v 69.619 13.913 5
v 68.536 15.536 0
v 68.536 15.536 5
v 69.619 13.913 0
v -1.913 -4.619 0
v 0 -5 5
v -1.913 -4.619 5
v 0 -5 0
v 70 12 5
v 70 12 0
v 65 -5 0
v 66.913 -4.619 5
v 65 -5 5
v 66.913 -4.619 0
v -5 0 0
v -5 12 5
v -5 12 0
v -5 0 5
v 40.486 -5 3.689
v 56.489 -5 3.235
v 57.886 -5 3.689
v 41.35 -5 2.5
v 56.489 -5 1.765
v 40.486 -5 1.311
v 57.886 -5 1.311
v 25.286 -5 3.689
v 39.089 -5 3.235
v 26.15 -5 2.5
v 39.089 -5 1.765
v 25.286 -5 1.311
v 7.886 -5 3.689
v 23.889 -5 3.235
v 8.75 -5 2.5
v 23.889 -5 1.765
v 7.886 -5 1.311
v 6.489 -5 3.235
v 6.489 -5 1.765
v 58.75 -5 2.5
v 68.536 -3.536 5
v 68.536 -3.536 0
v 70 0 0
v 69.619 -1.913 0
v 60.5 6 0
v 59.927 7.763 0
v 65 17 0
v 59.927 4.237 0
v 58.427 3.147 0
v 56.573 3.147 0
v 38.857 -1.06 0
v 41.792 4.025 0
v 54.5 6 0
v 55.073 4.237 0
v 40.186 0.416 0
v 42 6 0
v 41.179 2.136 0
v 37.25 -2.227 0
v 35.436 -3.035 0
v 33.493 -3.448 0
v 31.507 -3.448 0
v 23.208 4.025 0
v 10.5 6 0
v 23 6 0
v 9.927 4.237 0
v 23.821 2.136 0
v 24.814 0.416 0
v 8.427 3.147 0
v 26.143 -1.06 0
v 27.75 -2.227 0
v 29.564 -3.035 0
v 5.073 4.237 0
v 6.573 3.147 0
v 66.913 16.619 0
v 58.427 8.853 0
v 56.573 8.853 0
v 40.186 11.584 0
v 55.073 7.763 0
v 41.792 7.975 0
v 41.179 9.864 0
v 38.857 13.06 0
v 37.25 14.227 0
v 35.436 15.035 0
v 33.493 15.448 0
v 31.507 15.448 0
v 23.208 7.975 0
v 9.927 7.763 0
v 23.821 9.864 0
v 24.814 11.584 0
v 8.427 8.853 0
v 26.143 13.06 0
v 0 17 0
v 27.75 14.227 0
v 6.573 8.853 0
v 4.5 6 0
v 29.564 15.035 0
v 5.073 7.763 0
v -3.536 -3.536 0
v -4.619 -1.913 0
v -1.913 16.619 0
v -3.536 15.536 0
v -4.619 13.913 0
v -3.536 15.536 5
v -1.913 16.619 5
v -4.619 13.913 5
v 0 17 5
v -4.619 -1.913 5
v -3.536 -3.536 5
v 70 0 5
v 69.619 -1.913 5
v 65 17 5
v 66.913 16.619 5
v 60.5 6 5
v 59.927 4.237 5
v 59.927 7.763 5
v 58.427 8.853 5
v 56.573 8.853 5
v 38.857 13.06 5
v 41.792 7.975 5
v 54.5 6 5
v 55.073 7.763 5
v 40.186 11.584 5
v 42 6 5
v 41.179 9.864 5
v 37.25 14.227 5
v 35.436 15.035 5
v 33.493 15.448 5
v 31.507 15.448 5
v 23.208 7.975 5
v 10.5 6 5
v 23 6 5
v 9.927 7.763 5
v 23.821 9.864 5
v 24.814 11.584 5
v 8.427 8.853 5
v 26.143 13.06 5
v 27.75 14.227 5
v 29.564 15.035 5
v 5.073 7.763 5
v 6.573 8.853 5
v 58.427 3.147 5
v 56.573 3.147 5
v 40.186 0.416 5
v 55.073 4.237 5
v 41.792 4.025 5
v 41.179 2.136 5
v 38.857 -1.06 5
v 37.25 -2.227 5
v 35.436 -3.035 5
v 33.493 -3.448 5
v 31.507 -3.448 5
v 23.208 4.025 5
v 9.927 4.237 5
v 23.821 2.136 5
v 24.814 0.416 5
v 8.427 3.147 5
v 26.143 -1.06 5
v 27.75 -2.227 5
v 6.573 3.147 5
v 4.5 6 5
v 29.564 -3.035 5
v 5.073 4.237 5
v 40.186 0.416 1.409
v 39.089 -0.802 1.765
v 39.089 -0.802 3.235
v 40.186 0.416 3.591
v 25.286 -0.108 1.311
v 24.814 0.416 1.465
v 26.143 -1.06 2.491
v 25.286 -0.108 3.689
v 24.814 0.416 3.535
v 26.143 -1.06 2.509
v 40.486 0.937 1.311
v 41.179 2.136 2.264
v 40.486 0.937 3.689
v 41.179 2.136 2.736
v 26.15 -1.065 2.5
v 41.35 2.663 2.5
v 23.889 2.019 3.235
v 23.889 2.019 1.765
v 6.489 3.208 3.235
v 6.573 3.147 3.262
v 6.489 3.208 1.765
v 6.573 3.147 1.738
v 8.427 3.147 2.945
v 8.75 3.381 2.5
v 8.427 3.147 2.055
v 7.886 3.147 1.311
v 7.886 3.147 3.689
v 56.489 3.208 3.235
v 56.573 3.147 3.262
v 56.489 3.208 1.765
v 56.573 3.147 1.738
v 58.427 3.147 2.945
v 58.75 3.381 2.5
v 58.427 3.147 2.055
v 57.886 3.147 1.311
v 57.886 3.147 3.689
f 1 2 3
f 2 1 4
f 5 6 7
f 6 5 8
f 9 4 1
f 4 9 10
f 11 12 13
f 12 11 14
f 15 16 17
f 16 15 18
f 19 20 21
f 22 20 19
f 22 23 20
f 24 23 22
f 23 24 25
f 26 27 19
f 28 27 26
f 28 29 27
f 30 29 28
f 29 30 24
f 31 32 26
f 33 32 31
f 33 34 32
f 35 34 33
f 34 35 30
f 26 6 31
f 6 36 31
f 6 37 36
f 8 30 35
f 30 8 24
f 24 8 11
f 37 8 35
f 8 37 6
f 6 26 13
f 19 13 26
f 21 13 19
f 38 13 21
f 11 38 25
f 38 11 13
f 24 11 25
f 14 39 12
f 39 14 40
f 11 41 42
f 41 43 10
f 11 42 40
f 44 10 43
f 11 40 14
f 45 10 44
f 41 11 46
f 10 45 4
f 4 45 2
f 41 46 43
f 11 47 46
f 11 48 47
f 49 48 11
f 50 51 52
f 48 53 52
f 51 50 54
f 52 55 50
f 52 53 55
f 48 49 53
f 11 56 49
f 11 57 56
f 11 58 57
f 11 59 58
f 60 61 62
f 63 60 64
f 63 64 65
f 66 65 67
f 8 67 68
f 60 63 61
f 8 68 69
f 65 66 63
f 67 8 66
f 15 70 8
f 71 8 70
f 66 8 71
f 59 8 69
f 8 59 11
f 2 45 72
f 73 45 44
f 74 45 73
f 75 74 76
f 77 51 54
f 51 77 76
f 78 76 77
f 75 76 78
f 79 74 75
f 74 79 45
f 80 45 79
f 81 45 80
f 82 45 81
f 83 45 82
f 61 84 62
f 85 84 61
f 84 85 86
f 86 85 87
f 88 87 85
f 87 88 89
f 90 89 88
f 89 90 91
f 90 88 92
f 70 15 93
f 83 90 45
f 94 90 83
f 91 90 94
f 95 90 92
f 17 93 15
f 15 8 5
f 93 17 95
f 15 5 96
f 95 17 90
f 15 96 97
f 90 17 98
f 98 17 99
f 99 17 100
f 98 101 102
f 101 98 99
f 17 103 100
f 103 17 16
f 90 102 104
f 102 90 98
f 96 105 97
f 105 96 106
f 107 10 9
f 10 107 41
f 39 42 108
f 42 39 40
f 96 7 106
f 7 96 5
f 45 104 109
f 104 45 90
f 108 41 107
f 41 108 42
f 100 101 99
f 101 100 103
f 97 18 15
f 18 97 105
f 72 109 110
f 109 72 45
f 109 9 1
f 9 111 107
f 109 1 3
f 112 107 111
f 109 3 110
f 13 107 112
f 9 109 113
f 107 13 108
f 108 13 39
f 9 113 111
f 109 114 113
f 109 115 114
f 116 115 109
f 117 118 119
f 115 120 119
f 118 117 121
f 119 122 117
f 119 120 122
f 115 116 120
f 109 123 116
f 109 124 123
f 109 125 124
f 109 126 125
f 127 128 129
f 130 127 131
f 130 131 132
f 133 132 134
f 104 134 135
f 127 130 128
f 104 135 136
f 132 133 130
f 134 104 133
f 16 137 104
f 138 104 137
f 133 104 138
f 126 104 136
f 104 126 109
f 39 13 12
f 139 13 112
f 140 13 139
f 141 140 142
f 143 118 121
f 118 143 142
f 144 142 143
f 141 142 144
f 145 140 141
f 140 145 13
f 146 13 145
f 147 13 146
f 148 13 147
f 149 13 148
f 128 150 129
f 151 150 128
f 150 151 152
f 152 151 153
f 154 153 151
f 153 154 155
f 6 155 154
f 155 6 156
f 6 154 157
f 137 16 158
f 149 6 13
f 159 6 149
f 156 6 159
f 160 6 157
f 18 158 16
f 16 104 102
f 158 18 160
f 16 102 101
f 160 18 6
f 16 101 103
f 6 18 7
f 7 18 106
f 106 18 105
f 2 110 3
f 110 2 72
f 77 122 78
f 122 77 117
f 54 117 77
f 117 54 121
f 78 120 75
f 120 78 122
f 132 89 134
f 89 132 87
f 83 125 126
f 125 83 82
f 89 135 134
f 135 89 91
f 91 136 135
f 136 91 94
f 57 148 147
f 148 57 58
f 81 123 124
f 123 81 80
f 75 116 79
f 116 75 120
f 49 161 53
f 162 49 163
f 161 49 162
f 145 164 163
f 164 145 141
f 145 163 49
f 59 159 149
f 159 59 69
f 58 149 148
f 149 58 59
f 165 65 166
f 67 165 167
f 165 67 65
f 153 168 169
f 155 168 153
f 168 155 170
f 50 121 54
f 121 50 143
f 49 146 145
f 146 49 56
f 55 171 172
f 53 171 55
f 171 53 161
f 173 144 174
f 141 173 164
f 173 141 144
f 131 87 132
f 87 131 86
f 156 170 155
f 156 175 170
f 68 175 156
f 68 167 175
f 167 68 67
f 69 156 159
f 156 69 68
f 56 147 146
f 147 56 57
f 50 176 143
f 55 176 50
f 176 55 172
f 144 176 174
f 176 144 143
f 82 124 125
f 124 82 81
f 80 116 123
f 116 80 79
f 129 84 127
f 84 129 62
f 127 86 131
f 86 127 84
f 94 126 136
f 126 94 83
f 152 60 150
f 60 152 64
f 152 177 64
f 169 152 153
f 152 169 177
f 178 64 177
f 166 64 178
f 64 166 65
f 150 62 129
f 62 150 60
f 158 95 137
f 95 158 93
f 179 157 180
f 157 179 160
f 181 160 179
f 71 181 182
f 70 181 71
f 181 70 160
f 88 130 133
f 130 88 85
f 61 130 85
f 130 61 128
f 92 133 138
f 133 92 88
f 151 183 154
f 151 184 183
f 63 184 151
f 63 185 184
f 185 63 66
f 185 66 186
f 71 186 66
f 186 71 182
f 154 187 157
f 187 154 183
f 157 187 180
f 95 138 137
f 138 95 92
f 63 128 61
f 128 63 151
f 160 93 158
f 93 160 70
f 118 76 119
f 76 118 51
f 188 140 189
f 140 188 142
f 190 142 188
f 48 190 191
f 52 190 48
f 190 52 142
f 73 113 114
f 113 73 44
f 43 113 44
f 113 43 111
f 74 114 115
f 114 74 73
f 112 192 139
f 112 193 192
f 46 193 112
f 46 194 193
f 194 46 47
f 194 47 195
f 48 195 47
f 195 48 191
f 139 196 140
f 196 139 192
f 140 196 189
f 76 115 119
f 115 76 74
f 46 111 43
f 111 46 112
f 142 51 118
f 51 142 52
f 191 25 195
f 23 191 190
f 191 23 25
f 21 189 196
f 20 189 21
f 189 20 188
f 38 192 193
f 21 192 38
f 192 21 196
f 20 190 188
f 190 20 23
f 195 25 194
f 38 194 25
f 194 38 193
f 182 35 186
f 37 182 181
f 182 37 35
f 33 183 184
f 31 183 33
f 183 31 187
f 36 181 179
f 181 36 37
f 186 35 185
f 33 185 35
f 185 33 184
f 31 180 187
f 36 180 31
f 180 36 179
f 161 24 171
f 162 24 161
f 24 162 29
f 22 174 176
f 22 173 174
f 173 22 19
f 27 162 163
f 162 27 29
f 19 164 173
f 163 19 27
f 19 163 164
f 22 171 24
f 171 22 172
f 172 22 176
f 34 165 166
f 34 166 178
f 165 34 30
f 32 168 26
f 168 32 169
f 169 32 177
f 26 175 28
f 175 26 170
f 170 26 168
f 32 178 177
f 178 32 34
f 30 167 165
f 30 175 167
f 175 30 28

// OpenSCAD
// Base of stand
// Note, remote the radius from the dimensions
// of th rectangular base
base_width = 12;
base_thickness = 5;
base_length = 65;
curve_radius = 5;

// Risers
riser_radius = 3;
riser_separation = 50;

// DCDT
dcdt_radius = 9.5;

// Screw Holes
screw_radius = 1.25;

// Make the base of the stand with holes for the magnets
difference(){
// Base
linear_extrude(height = base_thickness) 
minkowski()
{
square([base_length ,base_width]);
circle(5);
}

// Make holes in base for magnets
translate([base_length/2,base_width/2,0]) cylinder(2*base_thickness,dcdt_radius,dcdt_radius);

translate([base_length/2-riser_separation/2,base_width/2,-0.5*base_thickness]) cylinder(2*base_thickness,riser_radius,riser_radius);

translate([base_length/2+riser_separation/2,base_width/2,-0.5*base_thickness]) cylinder(2*base_thickness,riser_radius,riser_radius);

// Make the screw holes for the risers
translate([base_length/2+riser_separation/2,0.7*base_width/2,0.5*base_thickness]) rotate([90,0,0]) cylinder(1.5*base_width,screw_radius,screw_radius);

translate([base_length/2-riser_separation/2,0.7*base_width/2,0.5*base_thickness]) rotate([90,0,0]) cylinder(1.5*base_width,screw_radius,screw_radius);

// Make the screw holes for the DCDT 
translate([base_length/2+dcdt_radius/1.25,base_width/2,0.5*base_thickness]) rotate([90,0,0]) cylinder(1.5*base_width,screw_radius,screw_radius);

translate([base_length/2-dcdt_radius/1.25,base_width/2,0.5*base_thickness]) rotate([90,0,0]) cylinder(1.5*base_width,screw_radius,screw_radius);


}
